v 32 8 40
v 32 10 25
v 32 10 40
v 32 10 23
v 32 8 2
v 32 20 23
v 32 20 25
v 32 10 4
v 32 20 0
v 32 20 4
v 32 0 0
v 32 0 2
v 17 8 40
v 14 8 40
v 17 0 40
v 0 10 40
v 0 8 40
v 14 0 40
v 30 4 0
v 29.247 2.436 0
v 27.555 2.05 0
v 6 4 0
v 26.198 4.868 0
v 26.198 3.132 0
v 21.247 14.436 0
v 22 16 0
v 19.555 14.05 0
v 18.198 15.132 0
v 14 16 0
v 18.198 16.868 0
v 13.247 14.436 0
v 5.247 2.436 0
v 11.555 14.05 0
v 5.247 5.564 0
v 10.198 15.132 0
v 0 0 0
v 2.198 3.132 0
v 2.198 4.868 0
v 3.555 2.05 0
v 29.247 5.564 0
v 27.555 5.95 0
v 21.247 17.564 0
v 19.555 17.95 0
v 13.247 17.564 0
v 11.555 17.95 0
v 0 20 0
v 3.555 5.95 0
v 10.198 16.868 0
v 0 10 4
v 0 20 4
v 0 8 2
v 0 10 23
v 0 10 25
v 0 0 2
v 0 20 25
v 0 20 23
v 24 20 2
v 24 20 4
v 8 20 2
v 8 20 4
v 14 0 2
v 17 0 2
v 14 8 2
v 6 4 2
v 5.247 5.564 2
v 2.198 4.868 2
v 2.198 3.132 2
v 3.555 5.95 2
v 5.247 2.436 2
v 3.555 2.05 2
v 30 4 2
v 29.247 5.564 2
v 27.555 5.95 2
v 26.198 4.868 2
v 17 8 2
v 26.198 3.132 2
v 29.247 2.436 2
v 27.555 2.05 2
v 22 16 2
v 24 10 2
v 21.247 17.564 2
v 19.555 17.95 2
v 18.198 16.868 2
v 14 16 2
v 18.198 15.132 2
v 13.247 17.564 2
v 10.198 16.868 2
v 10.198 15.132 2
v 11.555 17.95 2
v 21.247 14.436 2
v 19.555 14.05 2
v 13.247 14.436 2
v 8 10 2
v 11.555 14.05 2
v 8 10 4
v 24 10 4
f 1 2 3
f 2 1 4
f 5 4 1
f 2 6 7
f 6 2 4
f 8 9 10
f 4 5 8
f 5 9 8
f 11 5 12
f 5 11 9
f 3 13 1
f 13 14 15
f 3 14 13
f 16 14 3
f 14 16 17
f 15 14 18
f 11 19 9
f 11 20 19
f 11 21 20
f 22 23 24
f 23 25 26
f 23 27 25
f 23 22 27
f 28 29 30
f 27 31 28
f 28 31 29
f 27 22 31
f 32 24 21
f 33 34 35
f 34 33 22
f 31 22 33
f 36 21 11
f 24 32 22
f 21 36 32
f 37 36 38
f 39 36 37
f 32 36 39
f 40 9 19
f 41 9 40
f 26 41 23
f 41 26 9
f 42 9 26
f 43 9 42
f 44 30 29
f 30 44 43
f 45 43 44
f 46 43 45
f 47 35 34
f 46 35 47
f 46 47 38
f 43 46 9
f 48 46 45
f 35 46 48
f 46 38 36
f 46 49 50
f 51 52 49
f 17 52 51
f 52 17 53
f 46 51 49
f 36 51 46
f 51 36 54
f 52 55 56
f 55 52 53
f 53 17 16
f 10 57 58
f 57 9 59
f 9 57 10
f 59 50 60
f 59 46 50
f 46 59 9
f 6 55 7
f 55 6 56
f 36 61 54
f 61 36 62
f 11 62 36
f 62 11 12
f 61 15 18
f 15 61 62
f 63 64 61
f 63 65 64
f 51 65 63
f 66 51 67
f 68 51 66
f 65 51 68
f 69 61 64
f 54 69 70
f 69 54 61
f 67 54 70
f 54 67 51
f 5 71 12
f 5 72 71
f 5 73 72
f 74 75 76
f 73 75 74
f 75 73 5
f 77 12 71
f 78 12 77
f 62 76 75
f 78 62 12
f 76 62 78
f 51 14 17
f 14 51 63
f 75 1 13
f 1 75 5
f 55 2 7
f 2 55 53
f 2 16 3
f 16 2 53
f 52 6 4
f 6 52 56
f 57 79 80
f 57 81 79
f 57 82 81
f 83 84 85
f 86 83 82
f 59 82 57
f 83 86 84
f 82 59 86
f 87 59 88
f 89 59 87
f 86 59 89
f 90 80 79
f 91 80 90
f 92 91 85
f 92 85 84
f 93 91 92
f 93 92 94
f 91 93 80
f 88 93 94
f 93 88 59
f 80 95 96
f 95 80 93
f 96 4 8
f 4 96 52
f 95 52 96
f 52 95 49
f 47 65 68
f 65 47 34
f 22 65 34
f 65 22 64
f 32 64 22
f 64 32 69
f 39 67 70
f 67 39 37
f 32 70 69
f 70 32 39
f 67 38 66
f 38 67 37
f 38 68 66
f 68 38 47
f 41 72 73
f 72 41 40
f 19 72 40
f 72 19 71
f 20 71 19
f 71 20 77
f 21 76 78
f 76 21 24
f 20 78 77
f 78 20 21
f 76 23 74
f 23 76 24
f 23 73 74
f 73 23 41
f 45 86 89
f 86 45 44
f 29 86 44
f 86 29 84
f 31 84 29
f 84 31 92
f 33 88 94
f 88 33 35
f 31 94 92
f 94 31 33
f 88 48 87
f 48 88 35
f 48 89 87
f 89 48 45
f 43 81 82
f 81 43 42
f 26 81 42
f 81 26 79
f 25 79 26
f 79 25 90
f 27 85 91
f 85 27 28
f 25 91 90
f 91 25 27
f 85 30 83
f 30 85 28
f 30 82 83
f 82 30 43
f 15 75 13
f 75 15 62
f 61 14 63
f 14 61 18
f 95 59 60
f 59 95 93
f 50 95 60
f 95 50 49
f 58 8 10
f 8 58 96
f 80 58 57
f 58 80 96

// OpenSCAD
largeur = 4;
hauteur = 5;
epaisseur = 2;
difference(){
difference(){
    cube([largeur*8, 20, hauteur*8]);
    translate([-1,-1,epaisseur]){
        cube([largeur*8+2, 9, hauteur*8]);
    };
    translate([-1,8+epaisseur,24+epaisseur/2]){
        cube([largeur*8+2, 8+epaisseur+1, 24+epaisseur/2]);
    };
    translate([-1,8+epaisseur,epaisseur]){
        cube([largeur*8+2, 8+epaisseur+1, 24-epaisseur/2-epaisseur]);
    };
};


/*union(){
for(i=[0:largeur]){
    for(j=[0:1]){
      
        translate([4+i*8, 12, 8+j*8]){
            rotate([90,0,0]){
            cylinder(h=4, r= 2);
            }
        }
    };
    for(j=[3:hauteur-2]){
      
        translate([4+i*8, 12, 8+j*8]){
            rotate([90,0,0]){
            cylinder(h=4, r= 2);
            }
        }
    }
    
    
    }
};*/
union(){
    for(i=[0:largeur]){
        translate([4+i*8, 4, -1]){
            if(i==0 || i == largeur-1)
            cylinder(h=4, r=2);
            }
    }
};

union(){
    for(i=[0:largeur]){
        translate([4+i*8, 16, -1]){
            if(i!=0 && i != largeur-1)
            cylinder(h=epaisseur+2, r=2);
            }
    }
};

}

translate([14,0,0]){cube([3, 9,hauteur*8 ]);};

translate([0, 9, 0]){cube([8,11, epaisseur+2]);};
translate([8*(largeur-1), 9, 0]){cube([8,11, epaisseur+2]);};
